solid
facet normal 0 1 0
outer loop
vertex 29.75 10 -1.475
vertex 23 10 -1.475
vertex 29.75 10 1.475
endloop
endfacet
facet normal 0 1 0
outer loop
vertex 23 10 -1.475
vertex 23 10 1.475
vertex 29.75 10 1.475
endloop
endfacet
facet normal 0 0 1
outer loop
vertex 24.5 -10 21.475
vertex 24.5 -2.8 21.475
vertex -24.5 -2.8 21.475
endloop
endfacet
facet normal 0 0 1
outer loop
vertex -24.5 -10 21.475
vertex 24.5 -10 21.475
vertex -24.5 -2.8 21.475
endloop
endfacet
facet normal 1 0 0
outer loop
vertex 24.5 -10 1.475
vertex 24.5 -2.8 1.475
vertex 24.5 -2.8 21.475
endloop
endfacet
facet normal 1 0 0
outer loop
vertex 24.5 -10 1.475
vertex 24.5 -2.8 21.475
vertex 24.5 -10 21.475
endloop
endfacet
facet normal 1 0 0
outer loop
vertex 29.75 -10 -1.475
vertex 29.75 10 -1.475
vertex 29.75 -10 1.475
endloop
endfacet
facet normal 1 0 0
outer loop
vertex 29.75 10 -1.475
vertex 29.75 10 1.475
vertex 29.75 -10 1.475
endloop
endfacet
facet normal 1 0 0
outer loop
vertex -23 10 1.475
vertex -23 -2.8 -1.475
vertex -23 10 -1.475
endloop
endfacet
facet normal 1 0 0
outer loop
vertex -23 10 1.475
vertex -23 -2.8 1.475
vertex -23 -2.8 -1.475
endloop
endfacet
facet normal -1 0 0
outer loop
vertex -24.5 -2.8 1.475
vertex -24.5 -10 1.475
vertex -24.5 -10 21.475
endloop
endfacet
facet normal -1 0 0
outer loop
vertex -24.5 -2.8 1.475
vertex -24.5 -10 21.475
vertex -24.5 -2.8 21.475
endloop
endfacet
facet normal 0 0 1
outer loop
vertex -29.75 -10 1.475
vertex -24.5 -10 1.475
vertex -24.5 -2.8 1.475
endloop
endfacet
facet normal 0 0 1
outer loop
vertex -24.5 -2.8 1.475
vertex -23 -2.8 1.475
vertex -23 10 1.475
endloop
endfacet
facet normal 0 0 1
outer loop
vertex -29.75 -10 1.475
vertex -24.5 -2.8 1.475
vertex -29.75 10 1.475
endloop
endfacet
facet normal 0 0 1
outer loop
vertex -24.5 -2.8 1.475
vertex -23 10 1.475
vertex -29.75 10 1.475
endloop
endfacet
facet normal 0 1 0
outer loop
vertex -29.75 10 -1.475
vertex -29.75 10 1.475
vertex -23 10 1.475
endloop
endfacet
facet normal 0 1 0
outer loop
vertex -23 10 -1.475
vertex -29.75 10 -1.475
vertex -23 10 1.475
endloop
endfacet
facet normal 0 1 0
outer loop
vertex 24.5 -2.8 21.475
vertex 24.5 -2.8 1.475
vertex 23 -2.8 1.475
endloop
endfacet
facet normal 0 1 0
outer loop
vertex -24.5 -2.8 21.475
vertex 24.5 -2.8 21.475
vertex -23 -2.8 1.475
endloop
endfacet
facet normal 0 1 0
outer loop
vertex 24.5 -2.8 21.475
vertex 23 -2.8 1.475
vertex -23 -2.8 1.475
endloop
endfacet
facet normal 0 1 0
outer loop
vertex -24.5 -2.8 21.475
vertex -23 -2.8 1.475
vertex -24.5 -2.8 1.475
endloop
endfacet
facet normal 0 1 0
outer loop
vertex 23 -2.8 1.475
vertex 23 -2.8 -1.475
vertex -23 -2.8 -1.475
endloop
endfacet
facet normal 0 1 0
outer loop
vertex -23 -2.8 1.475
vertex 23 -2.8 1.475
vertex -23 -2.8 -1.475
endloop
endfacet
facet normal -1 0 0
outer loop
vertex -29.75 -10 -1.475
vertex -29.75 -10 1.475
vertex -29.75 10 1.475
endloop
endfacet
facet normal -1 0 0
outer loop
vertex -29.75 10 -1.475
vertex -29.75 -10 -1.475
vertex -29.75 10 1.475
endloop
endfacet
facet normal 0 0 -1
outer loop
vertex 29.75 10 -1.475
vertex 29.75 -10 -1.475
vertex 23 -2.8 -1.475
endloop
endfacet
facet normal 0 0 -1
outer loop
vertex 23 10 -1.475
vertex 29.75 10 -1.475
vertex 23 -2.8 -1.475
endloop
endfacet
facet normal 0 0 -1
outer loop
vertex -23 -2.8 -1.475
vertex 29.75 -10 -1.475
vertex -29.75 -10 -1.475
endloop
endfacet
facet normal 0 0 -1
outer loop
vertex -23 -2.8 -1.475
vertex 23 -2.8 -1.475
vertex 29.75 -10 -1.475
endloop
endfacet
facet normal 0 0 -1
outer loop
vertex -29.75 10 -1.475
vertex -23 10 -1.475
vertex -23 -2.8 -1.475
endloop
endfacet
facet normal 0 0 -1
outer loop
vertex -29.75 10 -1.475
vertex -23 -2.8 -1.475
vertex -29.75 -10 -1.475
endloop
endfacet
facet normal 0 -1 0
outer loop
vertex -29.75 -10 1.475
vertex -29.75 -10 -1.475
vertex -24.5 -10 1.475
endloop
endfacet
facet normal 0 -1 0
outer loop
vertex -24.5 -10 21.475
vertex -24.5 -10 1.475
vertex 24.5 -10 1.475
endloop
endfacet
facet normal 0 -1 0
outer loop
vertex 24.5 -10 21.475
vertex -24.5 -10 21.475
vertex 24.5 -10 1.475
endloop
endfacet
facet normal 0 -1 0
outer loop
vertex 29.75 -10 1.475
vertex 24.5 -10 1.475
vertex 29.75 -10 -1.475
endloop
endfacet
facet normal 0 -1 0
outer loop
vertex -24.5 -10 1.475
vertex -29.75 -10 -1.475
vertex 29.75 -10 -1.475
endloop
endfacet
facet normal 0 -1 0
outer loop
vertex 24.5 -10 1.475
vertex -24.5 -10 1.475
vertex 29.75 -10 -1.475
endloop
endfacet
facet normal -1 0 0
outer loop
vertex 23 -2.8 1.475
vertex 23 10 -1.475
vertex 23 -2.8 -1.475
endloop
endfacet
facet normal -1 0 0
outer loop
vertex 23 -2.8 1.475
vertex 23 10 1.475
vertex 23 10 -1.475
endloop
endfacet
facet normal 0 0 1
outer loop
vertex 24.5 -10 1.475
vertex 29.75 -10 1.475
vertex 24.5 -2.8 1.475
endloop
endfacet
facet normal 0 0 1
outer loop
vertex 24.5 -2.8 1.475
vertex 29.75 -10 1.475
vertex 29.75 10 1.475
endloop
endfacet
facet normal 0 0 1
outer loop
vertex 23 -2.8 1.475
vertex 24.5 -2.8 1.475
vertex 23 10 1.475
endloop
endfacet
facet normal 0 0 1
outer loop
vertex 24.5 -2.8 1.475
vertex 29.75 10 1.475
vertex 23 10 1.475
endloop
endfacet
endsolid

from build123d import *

# Parameters (mm, degrees)
BOSS_EXTRUDE1_DEPTH = 1.475
BOSS_EXTRUDE2_DEPTH = 20


with BuildPart() as part:
    # Sketch1 → Boss-Extrude1 (new, symmetric)
    with BuildSketch(Plane.XY):
        Polygon((-29.75, 10), (-23, 10), (-23, -1.3), (-23, -2.8), (23, -2.8), (23, -1.3), (23, 10), (29.75, 10), (29.75, -10), (-29.75, -10), align=None)
    extrude(amount=BOSS_EXTRUDE1_DEPTH, both=True)

    # Sketch2 → Boss-Extrude2 (add)
    with BuildSketch(Plane.XY.offset(1.475)):
        Polygon((-23, -2.8), (23, -2.8), (24.5, -2.8), (24.5, -10), (23, -10), (-23, -10), (-24.5, -10), (-24.5, -2.8), align=None)
    extrude(amount=BOSS_EXTRUDE2_DEPTH)


solid = part.part
